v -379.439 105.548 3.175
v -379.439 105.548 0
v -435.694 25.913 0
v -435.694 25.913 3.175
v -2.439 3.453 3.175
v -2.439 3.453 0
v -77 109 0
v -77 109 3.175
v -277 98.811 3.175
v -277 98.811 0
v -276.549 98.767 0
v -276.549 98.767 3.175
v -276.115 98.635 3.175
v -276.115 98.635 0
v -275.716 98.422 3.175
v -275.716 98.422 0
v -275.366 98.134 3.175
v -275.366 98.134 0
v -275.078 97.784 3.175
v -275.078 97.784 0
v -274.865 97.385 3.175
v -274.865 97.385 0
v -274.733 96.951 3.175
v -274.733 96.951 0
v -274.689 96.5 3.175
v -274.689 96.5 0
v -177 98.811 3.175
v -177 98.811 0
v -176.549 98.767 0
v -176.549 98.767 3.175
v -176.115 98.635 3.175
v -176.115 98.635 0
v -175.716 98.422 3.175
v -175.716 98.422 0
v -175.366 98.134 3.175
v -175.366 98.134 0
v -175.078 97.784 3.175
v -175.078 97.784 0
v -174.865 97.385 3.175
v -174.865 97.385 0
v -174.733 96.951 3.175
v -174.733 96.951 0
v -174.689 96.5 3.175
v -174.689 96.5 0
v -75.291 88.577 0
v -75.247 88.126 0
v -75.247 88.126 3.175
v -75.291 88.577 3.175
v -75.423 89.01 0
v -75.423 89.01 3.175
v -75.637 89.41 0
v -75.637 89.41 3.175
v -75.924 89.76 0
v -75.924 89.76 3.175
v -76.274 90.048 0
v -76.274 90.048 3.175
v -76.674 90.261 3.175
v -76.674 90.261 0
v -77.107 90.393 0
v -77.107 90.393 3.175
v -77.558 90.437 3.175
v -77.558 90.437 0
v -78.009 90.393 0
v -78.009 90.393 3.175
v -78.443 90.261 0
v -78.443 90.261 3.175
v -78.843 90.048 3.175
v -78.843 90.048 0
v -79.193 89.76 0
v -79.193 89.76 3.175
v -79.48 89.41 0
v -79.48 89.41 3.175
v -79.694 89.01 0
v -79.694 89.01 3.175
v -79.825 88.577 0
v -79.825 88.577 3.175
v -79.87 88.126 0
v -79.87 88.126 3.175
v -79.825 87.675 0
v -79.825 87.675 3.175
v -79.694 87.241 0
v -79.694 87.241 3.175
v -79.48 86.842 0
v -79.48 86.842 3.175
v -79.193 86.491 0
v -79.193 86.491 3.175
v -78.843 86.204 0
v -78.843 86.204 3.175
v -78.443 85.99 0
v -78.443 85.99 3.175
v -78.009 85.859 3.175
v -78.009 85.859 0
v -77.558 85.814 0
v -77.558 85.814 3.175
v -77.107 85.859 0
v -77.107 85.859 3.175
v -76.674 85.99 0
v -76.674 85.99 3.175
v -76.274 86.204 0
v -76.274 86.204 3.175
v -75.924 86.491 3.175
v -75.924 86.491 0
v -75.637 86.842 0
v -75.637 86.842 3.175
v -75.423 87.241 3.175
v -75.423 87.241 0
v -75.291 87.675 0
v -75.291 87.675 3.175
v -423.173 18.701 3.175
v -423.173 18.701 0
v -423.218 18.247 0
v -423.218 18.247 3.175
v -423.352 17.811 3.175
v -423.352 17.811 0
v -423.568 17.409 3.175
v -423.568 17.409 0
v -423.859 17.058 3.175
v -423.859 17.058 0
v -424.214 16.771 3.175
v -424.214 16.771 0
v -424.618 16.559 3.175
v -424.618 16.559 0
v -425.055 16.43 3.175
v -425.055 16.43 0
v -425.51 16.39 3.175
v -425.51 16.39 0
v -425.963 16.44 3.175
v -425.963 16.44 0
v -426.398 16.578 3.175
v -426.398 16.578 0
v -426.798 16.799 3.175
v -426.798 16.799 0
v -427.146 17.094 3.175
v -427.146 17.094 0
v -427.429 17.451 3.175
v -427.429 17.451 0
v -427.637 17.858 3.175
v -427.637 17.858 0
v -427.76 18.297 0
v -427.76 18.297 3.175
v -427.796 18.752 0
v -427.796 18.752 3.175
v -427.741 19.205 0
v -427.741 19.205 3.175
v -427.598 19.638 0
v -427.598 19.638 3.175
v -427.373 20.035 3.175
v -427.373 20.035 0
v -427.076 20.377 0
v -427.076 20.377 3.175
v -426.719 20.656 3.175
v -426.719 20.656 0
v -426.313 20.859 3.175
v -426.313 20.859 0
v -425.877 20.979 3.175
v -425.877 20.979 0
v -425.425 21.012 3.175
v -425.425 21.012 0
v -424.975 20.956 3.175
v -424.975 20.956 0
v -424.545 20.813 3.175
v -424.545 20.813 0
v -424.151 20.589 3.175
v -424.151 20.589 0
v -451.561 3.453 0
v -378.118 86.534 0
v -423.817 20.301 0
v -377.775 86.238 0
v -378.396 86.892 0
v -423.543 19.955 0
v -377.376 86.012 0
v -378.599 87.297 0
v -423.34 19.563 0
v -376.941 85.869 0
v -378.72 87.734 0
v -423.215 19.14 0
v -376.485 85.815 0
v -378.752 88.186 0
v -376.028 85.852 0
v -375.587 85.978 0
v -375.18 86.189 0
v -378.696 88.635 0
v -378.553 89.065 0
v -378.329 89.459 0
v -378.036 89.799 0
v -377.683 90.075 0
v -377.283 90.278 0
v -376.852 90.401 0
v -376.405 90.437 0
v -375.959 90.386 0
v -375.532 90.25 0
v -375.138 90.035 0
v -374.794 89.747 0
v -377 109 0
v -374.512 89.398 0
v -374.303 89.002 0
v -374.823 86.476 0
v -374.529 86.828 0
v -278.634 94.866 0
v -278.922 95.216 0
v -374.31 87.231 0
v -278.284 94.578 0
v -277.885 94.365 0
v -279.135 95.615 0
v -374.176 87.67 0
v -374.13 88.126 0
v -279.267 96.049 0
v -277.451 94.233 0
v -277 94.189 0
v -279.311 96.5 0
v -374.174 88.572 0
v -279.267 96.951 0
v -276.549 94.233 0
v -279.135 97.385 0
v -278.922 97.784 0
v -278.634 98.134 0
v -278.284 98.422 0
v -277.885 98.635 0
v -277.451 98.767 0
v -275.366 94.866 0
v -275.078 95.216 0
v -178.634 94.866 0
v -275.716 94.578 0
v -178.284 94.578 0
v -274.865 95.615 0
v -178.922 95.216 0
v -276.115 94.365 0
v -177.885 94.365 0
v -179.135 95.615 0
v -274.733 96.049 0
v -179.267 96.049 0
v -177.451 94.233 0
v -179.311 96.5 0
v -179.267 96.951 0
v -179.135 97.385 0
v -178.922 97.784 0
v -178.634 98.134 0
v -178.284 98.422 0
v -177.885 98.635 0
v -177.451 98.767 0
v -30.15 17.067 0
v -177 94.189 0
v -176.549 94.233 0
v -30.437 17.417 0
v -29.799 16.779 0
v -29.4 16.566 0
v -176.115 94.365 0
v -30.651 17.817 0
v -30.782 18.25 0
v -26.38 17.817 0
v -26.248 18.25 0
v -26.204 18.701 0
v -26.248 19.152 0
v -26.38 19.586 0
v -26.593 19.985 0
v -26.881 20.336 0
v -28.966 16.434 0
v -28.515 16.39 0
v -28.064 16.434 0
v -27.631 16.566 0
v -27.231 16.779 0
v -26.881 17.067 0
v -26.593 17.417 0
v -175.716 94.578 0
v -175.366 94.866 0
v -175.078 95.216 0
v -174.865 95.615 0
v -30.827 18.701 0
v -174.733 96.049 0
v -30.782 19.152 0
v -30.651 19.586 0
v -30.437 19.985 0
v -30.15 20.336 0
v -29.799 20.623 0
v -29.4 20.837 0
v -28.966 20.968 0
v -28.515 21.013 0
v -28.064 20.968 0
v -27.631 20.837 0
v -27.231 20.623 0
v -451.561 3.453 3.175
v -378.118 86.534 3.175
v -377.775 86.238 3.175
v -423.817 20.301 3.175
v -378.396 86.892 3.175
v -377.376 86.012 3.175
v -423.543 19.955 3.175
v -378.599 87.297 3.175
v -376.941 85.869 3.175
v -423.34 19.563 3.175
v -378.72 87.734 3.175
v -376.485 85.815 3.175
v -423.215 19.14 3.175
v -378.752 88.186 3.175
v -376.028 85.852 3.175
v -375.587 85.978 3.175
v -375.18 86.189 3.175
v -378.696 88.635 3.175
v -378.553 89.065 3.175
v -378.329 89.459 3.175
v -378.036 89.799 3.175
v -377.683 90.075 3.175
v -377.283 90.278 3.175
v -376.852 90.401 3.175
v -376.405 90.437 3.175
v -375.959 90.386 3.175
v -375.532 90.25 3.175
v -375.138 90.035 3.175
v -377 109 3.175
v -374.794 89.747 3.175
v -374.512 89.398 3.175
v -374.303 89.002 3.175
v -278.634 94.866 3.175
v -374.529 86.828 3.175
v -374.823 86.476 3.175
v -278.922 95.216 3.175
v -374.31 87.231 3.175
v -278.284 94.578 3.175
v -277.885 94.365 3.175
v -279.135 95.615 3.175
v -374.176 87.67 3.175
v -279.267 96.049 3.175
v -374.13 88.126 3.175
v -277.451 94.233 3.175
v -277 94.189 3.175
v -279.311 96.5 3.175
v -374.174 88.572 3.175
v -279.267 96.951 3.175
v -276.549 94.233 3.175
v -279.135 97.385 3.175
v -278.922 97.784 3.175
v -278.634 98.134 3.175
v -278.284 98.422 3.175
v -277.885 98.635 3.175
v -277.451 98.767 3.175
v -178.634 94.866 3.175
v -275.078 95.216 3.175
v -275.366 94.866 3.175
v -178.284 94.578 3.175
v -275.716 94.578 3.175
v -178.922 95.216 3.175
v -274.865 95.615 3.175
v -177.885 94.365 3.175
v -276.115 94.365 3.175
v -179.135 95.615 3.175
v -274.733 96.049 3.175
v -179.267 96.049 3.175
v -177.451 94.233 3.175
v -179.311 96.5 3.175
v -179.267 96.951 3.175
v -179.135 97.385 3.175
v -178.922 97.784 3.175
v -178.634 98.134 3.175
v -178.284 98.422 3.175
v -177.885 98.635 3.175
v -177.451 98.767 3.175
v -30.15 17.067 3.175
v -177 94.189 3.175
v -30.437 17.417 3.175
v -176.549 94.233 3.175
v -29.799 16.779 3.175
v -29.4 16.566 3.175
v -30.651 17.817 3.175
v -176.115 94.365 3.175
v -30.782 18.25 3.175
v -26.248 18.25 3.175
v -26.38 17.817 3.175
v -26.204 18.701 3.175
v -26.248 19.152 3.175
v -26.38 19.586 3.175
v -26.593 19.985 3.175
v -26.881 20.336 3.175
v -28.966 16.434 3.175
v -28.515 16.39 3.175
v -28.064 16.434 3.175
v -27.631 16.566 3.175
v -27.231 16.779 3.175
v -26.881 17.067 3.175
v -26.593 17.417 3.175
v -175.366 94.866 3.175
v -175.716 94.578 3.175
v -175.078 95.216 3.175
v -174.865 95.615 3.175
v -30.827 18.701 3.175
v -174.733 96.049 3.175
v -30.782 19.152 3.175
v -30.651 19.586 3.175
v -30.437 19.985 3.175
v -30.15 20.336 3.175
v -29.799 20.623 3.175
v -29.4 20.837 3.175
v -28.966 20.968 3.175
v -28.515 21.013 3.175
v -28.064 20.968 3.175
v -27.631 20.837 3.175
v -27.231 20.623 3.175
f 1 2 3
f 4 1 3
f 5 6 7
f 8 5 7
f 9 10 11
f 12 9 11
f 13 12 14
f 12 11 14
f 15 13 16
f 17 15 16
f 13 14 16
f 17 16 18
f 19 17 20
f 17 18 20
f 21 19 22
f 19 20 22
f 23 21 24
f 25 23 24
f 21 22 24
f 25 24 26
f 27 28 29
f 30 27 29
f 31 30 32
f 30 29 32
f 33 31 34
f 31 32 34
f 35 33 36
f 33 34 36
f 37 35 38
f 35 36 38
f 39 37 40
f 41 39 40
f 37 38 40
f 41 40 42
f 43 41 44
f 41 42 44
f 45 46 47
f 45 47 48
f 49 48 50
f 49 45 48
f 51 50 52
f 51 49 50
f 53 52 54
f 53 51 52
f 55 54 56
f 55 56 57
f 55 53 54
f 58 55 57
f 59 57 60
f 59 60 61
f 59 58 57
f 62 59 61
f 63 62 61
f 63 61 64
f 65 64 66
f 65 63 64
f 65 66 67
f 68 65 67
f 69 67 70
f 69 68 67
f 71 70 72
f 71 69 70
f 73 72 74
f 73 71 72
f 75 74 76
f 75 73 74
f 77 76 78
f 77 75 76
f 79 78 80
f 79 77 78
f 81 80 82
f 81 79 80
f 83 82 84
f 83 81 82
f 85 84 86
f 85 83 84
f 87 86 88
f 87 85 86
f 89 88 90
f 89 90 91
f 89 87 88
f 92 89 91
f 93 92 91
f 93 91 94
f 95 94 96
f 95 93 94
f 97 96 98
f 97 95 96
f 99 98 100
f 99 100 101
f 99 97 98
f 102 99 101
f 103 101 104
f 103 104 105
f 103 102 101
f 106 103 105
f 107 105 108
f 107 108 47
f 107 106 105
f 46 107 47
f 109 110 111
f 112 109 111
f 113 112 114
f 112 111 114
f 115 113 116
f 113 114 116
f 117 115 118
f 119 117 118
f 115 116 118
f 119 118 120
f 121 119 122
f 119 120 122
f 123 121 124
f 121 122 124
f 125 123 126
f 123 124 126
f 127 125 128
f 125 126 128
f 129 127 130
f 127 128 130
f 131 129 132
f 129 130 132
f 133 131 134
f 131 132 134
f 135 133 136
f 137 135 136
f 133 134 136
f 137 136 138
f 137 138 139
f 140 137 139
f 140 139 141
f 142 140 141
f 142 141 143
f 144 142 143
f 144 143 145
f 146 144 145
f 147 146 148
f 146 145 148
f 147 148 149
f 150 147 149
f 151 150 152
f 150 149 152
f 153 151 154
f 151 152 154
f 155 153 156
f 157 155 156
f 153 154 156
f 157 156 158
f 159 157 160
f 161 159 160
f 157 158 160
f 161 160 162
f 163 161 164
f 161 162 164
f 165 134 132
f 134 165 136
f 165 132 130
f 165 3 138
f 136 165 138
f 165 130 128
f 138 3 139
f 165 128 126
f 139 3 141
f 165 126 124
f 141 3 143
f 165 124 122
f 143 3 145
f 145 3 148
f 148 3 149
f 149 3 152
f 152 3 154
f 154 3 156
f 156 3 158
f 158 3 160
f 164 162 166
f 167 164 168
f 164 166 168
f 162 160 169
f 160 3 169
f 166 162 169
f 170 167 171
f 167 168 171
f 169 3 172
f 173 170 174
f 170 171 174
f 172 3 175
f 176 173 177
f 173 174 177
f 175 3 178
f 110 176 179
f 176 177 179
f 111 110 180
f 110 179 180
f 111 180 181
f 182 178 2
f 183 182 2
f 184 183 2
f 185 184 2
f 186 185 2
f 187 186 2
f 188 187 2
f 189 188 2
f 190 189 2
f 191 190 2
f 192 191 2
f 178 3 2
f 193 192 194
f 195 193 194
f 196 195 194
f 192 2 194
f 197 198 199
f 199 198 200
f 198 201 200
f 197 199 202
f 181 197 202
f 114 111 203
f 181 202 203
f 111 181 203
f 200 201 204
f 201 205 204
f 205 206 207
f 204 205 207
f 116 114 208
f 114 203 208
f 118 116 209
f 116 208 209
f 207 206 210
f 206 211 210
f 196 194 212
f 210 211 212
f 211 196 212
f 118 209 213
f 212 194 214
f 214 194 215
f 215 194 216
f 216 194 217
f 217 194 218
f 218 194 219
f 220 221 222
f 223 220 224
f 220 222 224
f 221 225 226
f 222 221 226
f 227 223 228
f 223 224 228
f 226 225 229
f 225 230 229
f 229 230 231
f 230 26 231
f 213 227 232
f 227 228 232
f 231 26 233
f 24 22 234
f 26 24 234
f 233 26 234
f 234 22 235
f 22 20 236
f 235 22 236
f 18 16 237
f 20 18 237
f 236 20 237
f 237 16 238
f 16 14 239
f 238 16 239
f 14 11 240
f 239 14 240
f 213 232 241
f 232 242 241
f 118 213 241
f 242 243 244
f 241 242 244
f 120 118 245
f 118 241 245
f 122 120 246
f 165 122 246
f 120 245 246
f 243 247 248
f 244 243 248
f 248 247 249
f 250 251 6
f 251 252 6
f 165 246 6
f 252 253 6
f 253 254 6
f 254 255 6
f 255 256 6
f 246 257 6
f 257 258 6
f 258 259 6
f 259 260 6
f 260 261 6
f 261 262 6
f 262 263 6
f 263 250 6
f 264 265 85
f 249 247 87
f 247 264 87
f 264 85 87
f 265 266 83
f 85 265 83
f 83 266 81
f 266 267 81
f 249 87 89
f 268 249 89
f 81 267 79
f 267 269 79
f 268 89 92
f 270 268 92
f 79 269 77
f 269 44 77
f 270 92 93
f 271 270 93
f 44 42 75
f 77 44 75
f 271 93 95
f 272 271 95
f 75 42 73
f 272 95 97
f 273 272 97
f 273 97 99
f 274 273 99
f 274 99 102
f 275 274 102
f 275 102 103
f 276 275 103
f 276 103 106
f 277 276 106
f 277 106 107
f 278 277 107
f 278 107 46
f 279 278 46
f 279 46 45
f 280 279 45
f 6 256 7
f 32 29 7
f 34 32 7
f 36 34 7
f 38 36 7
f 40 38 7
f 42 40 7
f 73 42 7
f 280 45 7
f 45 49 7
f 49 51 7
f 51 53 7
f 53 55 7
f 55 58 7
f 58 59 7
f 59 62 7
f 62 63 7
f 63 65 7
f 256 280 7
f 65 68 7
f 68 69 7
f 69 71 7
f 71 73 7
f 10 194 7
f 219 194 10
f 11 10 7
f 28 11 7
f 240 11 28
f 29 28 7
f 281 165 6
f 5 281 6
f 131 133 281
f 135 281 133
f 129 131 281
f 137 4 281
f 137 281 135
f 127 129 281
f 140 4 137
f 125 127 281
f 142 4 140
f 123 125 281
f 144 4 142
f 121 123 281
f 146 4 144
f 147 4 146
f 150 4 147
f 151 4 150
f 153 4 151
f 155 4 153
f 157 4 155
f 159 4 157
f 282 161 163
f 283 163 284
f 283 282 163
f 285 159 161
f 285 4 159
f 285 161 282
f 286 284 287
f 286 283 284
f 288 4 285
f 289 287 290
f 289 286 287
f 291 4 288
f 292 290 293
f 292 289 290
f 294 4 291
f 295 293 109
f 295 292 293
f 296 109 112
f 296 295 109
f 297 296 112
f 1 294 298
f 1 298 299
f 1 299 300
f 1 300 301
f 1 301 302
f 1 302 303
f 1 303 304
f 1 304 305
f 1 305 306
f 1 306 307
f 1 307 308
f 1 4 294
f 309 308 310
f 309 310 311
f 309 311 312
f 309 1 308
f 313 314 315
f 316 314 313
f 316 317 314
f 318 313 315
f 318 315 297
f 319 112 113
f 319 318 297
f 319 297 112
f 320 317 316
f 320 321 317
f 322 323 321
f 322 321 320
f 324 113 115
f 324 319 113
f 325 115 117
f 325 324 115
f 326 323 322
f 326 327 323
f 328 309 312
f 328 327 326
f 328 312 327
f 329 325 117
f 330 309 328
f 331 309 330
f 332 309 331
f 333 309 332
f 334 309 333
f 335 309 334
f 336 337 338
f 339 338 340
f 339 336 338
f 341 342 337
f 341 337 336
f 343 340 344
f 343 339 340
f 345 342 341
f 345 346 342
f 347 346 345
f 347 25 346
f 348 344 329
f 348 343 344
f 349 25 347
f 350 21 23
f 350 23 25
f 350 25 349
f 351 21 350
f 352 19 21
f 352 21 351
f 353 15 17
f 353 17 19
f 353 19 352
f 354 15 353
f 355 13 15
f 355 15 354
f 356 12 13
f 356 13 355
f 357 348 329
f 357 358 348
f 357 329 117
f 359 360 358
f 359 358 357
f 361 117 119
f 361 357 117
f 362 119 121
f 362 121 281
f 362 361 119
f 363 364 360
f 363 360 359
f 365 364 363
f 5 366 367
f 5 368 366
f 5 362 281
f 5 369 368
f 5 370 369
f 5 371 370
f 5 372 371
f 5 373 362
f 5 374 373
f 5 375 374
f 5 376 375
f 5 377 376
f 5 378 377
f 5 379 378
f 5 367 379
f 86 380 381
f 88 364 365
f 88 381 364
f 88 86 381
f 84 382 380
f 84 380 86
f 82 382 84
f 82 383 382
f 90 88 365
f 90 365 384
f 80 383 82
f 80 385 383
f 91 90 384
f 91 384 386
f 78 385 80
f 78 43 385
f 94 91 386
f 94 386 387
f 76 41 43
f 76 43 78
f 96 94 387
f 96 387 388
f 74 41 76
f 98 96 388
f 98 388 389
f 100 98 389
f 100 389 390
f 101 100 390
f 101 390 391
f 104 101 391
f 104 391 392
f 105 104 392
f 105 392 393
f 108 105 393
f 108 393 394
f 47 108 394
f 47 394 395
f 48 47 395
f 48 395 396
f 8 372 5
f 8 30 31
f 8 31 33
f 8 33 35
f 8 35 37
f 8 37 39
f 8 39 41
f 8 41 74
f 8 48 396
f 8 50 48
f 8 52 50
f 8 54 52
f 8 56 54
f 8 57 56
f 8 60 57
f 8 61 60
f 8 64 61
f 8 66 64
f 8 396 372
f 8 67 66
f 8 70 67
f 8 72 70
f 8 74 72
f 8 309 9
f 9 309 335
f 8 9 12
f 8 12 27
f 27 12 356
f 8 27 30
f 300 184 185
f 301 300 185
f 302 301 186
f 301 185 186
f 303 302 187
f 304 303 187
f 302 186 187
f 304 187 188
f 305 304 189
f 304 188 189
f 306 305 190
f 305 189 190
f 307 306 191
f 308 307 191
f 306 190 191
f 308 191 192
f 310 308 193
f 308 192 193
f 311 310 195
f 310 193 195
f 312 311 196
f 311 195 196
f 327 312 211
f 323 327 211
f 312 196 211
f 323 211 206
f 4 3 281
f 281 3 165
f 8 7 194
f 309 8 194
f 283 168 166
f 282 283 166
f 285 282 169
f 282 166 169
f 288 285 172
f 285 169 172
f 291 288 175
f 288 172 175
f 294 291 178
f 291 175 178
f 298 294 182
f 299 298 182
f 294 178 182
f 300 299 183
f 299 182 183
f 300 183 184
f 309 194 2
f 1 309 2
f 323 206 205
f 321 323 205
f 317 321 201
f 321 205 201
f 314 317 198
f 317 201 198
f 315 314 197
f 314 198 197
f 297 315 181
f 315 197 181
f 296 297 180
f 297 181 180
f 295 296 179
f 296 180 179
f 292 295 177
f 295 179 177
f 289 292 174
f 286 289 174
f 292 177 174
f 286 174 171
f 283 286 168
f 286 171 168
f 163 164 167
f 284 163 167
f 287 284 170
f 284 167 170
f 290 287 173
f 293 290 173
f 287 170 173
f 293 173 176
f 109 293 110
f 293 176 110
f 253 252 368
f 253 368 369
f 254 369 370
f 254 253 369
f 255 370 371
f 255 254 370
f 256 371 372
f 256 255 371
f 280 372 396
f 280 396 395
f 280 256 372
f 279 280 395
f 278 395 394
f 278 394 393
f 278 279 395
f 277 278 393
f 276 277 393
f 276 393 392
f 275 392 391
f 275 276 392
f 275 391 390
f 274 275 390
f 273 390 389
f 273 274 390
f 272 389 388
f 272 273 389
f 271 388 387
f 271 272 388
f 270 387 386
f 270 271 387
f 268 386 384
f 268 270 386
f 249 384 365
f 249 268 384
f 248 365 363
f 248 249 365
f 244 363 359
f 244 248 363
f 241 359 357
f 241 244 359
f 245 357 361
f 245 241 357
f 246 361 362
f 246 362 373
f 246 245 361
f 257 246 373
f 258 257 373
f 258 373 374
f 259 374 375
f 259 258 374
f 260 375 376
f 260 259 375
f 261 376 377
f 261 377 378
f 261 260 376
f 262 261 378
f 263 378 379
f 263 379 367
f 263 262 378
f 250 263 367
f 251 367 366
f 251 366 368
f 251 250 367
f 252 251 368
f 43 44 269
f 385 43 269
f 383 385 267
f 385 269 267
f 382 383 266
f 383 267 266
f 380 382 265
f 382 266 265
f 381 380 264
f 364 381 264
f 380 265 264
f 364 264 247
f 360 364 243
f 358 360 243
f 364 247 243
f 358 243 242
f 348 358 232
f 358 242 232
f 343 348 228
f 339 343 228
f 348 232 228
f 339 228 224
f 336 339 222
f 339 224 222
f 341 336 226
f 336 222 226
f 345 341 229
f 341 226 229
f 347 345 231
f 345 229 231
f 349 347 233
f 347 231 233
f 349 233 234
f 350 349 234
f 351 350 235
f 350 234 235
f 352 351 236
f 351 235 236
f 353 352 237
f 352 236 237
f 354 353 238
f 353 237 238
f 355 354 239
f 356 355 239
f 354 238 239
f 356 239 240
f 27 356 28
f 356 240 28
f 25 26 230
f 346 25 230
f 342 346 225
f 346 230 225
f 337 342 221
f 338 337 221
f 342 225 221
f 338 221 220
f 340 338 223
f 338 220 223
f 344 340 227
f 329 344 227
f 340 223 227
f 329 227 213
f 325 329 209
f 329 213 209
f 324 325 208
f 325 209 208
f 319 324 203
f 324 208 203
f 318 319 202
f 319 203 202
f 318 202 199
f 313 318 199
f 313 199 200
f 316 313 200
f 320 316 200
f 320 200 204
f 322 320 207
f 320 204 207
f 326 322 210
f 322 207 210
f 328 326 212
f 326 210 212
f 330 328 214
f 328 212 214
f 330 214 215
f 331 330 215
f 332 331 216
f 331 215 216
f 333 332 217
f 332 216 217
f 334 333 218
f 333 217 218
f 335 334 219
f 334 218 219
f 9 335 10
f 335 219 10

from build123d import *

# Parameters (mm, degrees)
F0_R     = 2.3114
F1_DEPTH = 3.175


with BuildPart() as f1:
    # F0 (on Top) → F1 (new body)
    with BuildSketch(Plane.XY):
        with BuildLine():
            Line((-451.5609132883, 3.4527331373), (-420.9521720122, 3.4527331373))
            Line((-420.9521720122, 3.4527331373), (-359.0199119076, 91.1230753634))
            Line((-359.0199119076, 91.1230753634), (-379.4389155629, 105.5475091382))
            Line((-379.4389155629, 105.5475091382), (-386.6511324503, 95.3380073106))
            Line((-386.6511324503, 95.3380073106), (-378.3294900246, 89.4594158723))
            ThreePointArc((-378.3294900246, 89.4594158723), (-375.7419979554, 90.3287620732), (-374.1302306227, 88.1257904232))
            ThreePointArc((-374.1302306227, 88.1257904232), (-375.3786094336, 86.0733392273), (-377.7752560717, 86.2379310212))
            Line((-377.7752560717, 86.2379310212), (-424.151080008, 20.5890373971))
            ThreePointArc((-424.151080008, 20.5890373971), (-423.4322542612, 19.7641991843), (-423.1733054571, 18.7011779952))
            ThreePointArc((-423.1733054571, 18.7011779952), (-426.1843381244, 16.4982063451), (-427.3725648591, 20.0348034442))
            Line((-427.3725648591, 20.0348034442), (-435.6942072848, 25.9133948826))
            Line((-435.6942072848, 25.9133948826), (-451.5609132883, 3.4527331373))
        make_face()
        Polygon((-359.0199119076, 91.1230753634), (-420.9521720122, 3.4527331373), (-2.4390867117, 3.4527331373), (-77, 109), (-177, 109), (-227, 109), (-277, 109), (-377, 109), (-379.4389155629, 105.5475091382), align=None)
        with Locations((-28.5152945429, 18.7011779952)):
            Circle(F0_R, mode=Mode.SUBTRACT)
        with BuildLine():
            ThreePointArc((-274.6886, 96.5), (-278.634406614, 94.865593386), (-277, 98.8114))
            ThreePointArc((-277, 98.8114), (-275.365593386, 98.134406614), (-274.6886, 96.5))
        make_face(mode=Mode.SUBTRACT)
        with Locations((-77.5583693773, 88.1257904232)):
            Circle(F0_R, mode=Mode.SUBTRACT)
        with BuildLine():
            ThreePointArc((-174.6886, 96.5), (-177, 94.1886), (-179.3114, 96.5))
            ThreePointArc((-179.3114, 96.5), (-178.634406614, 98.134406614), (-177, 98.8114))
            ThreePointArc((-177, 98.8114), (-175.365593386, 98.134406614), (-174.6886, 96.5))
        make_face(mode=Mode.SUBTRACT)
        with BuildLine():
            Line((-415.5, 54.5), (-435.6942072848, 25.9133948826))
            Line((-435.6942072848, 25.9133948826), (-427.3725648591, 20.0348034442))
            ThreePointArc((-427.3725648591, 20.0348034442), (-425.8766080436, 20.9791117788), (-424.151080008, 20.5890373971))
            Line((-424.151080008, 20.5890373971), (-377.7752560717, 86.2379310212))
            ThreePointArc((-377.7752560717, 86.2379310212), (-378.7195644063, 87.7338878367), (-378.3294900246, 89.4594158723))
            Line((-378.3294900246, 89.4594158723), (-386.6511324503, 95.3380073106))
            Line((-386.6511324503, 95.3380073106), (-415.5, 54.5))
        make_face()
    extrude(amount=F1_DEPTH)


solid = f1.part
